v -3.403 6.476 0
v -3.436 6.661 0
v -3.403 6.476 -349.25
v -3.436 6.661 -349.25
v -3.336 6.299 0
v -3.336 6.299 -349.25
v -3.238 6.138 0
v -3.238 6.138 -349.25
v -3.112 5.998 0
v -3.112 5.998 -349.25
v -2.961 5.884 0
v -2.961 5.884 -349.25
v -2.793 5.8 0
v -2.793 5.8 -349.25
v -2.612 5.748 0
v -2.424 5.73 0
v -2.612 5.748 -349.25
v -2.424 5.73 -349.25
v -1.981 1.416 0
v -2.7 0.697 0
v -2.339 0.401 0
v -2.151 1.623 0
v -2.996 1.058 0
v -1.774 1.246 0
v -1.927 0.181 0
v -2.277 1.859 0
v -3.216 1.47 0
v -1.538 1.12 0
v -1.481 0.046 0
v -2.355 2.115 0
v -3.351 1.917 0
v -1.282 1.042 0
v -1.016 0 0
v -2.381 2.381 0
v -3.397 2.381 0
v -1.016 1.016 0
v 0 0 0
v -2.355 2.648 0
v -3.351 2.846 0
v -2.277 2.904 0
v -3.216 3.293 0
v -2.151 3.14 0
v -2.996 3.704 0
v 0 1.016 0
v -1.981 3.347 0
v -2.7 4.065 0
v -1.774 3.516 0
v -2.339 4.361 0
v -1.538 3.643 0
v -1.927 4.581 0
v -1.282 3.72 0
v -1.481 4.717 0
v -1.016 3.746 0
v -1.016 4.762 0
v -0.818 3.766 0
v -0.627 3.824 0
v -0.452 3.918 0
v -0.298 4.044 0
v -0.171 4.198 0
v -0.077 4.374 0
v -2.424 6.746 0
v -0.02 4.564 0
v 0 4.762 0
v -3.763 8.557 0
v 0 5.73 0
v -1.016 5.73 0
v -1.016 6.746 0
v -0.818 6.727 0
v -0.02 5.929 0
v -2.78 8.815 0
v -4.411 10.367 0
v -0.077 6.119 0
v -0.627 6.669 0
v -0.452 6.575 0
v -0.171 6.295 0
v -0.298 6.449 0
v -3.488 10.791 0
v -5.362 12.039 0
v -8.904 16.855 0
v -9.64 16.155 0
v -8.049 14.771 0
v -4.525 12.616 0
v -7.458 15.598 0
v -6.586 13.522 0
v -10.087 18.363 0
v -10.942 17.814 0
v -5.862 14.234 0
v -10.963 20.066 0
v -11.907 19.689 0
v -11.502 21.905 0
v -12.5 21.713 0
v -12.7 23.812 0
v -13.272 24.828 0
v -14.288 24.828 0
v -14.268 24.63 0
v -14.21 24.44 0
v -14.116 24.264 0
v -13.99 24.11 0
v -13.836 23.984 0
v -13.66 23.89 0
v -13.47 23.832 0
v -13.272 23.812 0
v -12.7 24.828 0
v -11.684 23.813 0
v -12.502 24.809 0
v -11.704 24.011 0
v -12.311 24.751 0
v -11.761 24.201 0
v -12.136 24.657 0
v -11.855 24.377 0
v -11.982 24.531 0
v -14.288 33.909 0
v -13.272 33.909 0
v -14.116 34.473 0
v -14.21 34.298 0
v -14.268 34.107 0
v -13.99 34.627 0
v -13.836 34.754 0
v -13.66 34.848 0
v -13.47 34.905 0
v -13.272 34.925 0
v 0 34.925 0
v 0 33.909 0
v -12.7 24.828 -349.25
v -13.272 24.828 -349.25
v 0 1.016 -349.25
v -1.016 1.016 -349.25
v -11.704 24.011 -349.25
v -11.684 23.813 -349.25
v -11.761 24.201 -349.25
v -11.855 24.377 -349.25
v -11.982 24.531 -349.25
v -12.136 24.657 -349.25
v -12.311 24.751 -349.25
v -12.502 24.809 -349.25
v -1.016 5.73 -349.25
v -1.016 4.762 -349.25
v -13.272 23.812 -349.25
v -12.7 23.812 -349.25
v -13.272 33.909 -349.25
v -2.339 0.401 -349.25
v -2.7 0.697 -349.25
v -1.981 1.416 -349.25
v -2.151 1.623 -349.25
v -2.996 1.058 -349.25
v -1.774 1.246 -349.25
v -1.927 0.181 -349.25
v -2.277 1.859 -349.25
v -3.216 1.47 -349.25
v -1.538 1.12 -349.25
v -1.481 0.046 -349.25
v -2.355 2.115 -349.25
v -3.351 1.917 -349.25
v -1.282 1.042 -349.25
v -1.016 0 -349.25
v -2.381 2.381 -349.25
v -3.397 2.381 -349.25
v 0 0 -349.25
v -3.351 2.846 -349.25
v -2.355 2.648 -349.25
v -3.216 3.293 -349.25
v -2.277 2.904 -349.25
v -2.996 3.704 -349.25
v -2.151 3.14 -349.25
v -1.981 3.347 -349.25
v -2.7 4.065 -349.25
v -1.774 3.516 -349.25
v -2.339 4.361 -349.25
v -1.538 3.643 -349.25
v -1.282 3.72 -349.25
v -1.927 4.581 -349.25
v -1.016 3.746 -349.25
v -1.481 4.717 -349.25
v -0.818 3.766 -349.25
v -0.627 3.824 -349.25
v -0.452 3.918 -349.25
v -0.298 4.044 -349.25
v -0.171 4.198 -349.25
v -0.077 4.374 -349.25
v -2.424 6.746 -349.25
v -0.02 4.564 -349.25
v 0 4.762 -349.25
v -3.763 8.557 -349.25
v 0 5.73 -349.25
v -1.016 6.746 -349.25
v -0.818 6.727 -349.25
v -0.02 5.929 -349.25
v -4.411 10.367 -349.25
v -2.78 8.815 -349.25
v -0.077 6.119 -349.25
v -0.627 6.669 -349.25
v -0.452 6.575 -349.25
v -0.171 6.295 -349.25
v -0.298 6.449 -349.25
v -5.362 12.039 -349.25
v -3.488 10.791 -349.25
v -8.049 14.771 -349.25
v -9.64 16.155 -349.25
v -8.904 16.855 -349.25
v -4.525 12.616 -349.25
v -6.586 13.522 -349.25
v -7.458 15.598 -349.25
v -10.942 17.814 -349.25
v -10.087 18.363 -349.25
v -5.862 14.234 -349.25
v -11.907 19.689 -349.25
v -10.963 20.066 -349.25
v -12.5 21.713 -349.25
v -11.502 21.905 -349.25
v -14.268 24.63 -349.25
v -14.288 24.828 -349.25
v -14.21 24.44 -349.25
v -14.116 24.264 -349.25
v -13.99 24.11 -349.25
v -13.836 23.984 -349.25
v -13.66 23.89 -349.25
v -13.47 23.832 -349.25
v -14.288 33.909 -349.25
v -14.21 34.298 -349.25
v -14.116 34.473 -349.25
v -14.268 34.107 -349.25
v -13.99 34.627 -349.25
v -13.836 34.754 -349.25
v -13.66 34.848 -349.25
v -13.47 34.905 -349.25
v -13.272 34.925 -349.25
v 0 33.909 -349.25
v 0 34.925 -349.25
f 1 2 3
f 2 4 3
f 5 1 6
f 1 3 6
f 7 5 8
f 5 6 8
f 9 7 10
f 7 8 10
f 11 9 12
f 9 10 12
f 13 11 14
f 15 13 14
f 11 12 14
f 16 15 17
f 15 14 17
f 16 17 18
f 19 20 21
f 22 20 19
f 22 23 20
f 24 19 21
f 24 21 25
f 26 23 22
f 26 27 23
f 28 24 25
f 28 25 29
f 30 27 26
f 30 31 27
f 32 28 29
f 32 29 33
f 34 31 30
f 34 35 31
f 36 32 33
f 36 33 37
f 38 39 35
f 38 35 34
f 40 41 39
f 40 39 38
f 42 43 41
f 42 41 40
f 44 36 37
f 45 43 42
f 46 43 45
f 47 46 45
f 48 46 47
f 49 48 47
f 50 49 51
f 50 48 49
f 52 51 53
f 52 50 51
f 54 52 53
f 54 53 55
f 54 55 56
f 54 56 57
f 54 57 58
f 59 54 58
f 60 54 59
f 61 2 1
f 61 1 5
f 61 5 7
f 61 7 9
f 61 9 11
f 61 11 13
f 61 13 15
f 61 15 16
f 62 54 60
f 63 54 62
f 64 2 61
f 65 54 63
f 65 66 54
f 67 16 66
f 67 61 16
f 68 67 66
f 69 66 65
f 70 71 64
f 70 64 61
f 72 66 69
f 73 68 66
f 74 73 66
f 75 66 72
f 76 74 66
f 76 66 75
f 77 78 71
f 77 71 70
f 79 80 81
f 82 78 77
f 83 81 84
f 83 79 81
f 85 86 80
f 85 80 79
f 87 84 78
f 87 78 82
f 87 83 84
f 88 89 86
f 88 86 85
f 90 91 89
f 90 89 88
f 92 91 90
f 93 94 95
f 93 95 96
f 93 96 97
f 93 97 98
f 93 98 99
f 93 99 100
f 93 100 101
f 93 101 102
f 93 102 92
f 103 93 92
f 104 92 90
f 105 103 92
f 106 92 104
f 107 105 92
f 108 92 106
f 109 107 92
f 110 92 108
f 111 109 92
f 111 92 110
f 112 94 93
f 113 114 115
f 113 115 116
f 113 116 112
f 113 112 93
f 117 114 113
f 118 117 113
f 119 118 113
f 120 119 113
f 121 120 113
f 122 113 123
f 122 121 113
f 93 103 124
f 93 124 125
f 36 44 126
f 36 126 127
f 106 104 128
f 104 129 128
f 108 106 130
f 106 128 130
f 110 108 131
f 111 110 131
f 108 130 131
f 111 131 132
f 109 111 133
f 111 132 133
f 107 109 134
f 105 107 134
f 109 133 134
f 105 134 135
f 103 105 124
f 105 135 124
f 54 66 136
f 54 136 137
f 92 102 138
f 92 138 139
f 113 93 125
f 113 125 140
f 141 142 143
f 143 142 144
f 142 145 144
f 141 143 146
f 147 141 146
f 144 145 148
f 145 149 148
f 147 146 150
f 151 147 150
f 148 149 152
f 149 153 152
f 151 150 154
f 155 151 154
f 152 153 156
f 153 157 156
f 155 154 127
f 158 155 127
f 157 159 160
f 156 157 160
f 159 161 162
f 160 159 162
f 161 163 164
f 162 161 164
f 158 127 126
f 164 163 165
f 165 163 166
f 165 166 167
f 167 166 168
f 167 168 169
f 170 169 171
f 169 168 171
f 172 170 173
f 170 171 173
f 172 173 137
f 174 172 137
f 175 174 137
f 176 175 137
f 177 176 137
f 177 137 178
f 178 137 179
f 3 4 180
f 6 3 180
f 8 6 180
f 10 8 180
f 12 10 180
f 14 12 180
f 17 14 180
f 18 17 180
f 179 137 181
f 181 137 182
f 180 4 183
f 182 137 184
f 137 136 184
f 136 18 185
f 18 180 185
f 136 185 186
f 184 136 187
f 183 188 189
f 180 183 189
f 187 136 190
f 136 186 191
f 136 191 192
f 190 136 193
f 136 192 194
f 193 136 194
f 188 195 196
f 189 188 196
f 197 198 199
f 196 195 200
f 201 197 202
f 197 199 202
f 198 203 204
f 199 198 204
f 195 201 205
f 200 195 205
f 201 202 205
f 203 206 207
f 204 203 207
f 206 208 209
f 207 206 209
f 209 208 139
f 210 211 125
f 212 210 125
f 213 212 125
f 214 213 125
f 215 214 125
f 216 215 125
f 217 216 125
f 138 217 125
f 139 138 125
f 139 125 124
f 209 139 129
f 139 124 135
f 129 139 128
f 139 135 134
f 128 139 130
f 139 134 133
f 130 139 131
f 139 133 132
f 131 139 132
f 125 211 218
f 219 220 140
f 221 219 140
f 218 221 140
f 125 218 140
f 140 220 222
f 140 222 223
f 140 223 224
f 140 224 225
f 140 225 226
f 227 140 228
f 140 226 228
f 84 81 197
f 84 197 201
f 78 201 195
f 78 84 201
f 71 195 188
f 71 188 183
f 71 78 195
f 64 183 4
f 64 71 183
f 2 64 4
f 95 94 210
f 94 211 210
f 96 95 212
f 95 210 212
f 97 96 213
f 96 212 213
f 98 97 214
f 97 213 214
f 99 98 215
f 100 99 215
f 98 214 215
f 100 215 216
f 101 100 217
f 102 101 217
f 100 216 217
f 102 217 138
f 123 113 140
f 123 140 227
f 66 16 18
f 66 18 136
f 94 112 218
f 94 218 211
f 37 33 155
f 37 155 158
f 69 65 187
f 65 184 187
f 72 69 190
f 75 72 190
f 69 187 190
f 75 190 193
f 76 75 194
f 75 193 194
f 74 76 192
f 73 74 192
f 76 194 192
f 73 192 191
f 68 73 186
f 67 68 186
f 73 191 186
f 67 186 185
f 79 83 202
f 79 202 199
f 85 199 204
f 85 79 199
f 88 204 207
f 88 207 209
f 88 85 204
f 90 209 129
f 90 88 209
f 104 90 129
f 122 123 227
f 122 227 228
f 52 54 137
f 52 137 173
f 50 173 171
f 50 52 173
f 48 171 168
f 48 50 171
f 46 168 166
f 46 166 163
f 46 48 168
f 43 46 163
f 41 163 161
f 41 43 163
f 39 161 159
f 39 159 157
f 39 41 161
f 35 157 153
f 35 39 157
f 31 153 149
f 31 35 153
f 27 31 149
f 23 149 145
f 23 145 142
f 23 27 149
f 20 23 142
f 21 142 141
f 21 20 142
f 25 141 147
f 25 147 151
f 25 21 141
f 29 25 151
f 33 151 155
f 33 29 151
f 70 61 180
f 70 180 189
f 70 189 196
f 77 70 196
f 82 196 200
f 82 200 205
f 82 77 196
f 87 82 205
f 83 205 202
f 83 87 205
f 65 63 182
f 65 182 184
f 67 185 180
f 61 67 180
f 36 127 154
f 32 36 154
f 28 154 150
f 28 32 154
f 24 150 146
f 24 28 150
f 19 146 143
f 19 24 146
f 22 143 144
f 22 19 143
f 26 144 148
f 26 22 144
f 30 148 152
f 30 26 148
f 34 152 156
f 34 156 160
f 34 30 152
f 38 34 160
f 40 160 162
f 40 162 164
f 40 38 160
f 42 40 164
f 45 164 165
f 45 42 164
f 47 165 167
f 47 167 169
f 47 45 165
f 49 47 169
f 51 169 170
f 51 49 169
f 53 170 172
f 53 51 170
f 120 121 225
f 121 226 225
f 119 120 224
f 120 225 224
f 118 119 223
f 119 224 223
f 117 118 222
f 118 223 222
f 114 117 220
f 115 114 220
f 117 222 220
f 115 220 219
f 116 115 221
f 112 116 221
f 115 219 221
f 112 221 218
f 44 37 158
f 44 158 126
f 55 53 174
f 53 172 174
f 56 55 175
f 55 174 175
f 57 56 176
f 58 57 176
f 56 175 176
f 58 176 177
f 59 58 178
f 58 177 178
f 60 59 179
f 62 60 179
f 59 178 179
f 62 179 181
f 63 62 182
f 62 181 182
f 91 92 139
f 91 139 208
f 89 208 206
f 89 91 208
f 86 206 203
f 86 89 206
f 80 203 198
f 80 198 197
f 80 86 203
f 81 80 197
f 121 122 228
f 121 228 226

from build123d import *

# Parameters (mm, degrees)
EXTRUDE_THIN1_DEPTH = 349.25
FILLET1_R           = 1.016


with BuildPart() as part:
    # Sketch1 → Extrude-Thin1 (new body)
    with BuildSketch(Plane.XY):
        with BuildLine():
            Line((0, 34.925), (-14.2875, 34.925))
            Line((-14.2875, 34.925), (-14.2875, 23.8125))
            Line((-14.2875, 23.8125), (-12.7, 23.8125))
            ThreePointArc((-12.7, 23.8125), (-11.46897023, 18.728780658), (-8.048625, 14.771398298))
            ThreePointArc((-8.048625, 14.771398298), (-4.62827977, 10.814015938), (-3.39725, 5.730296596))
            Line((-3.39725, 5.730296596), (-1.016, 5.730296596))
            Line((-1.016, 5.730296596), (-1.016, 4.7625))
            ThreePointArc((-1.016, 4.7625), (-3.39725, 2.38125), (-1.016, 0))
            Line((-1.016, 0), (0, 0))
            Line((0, 0), (0, 1.016))
            Line((0, 1.016), (-1.016, 1.016))
            ThreePointArc((-1.016, 1.016), (-2.26278514, 2.93751826), (0, 3.29319932))
            Line((0, 3.29319932), (0, 6.746296596))
            Line((0, 6.746296596), (-2.423879893, 6.746296596))
            ThreePointArc((-2.423879893, 6.746296596), (-3.966915161, 11.726057249), (-7.457893571, 15.598013311))
            ThreePointArc((-7.457893571, 15.598013311), (-10.786815308, 19.651741643), (-11.632750432, 24.8285))
            Line((-11.632750432, 24.8285), (-13.2715, 24.8285))
            Line((-13.2715, 24.8285), (-13.2715, 33.909))
            Line((-13.2715, 33.909), (0, 33.909))
            Line((0, 33.909), (0, 34.925))
        make_face()
    extrude(amount=-EXTRUDE_THIN1_DEPTH)

    # Fillet1
    fillet1_edges = [part.edges().sort_by_distance(p)[0] for p in [
        (-11.632750432, 24.8285, -174.625),
        (0, 6.746296596, -174.625),
        (0, 3.29319932, -174.625),
        (-3.39725, 5.730296596, -174.625),
        (-14.2875, 23.8125, -174.625),
        (-14.2875, 34.925, -174.625),
    ]]
    fillet(fillet1_edges, radius=FILLET1_R)


solid = part.part
